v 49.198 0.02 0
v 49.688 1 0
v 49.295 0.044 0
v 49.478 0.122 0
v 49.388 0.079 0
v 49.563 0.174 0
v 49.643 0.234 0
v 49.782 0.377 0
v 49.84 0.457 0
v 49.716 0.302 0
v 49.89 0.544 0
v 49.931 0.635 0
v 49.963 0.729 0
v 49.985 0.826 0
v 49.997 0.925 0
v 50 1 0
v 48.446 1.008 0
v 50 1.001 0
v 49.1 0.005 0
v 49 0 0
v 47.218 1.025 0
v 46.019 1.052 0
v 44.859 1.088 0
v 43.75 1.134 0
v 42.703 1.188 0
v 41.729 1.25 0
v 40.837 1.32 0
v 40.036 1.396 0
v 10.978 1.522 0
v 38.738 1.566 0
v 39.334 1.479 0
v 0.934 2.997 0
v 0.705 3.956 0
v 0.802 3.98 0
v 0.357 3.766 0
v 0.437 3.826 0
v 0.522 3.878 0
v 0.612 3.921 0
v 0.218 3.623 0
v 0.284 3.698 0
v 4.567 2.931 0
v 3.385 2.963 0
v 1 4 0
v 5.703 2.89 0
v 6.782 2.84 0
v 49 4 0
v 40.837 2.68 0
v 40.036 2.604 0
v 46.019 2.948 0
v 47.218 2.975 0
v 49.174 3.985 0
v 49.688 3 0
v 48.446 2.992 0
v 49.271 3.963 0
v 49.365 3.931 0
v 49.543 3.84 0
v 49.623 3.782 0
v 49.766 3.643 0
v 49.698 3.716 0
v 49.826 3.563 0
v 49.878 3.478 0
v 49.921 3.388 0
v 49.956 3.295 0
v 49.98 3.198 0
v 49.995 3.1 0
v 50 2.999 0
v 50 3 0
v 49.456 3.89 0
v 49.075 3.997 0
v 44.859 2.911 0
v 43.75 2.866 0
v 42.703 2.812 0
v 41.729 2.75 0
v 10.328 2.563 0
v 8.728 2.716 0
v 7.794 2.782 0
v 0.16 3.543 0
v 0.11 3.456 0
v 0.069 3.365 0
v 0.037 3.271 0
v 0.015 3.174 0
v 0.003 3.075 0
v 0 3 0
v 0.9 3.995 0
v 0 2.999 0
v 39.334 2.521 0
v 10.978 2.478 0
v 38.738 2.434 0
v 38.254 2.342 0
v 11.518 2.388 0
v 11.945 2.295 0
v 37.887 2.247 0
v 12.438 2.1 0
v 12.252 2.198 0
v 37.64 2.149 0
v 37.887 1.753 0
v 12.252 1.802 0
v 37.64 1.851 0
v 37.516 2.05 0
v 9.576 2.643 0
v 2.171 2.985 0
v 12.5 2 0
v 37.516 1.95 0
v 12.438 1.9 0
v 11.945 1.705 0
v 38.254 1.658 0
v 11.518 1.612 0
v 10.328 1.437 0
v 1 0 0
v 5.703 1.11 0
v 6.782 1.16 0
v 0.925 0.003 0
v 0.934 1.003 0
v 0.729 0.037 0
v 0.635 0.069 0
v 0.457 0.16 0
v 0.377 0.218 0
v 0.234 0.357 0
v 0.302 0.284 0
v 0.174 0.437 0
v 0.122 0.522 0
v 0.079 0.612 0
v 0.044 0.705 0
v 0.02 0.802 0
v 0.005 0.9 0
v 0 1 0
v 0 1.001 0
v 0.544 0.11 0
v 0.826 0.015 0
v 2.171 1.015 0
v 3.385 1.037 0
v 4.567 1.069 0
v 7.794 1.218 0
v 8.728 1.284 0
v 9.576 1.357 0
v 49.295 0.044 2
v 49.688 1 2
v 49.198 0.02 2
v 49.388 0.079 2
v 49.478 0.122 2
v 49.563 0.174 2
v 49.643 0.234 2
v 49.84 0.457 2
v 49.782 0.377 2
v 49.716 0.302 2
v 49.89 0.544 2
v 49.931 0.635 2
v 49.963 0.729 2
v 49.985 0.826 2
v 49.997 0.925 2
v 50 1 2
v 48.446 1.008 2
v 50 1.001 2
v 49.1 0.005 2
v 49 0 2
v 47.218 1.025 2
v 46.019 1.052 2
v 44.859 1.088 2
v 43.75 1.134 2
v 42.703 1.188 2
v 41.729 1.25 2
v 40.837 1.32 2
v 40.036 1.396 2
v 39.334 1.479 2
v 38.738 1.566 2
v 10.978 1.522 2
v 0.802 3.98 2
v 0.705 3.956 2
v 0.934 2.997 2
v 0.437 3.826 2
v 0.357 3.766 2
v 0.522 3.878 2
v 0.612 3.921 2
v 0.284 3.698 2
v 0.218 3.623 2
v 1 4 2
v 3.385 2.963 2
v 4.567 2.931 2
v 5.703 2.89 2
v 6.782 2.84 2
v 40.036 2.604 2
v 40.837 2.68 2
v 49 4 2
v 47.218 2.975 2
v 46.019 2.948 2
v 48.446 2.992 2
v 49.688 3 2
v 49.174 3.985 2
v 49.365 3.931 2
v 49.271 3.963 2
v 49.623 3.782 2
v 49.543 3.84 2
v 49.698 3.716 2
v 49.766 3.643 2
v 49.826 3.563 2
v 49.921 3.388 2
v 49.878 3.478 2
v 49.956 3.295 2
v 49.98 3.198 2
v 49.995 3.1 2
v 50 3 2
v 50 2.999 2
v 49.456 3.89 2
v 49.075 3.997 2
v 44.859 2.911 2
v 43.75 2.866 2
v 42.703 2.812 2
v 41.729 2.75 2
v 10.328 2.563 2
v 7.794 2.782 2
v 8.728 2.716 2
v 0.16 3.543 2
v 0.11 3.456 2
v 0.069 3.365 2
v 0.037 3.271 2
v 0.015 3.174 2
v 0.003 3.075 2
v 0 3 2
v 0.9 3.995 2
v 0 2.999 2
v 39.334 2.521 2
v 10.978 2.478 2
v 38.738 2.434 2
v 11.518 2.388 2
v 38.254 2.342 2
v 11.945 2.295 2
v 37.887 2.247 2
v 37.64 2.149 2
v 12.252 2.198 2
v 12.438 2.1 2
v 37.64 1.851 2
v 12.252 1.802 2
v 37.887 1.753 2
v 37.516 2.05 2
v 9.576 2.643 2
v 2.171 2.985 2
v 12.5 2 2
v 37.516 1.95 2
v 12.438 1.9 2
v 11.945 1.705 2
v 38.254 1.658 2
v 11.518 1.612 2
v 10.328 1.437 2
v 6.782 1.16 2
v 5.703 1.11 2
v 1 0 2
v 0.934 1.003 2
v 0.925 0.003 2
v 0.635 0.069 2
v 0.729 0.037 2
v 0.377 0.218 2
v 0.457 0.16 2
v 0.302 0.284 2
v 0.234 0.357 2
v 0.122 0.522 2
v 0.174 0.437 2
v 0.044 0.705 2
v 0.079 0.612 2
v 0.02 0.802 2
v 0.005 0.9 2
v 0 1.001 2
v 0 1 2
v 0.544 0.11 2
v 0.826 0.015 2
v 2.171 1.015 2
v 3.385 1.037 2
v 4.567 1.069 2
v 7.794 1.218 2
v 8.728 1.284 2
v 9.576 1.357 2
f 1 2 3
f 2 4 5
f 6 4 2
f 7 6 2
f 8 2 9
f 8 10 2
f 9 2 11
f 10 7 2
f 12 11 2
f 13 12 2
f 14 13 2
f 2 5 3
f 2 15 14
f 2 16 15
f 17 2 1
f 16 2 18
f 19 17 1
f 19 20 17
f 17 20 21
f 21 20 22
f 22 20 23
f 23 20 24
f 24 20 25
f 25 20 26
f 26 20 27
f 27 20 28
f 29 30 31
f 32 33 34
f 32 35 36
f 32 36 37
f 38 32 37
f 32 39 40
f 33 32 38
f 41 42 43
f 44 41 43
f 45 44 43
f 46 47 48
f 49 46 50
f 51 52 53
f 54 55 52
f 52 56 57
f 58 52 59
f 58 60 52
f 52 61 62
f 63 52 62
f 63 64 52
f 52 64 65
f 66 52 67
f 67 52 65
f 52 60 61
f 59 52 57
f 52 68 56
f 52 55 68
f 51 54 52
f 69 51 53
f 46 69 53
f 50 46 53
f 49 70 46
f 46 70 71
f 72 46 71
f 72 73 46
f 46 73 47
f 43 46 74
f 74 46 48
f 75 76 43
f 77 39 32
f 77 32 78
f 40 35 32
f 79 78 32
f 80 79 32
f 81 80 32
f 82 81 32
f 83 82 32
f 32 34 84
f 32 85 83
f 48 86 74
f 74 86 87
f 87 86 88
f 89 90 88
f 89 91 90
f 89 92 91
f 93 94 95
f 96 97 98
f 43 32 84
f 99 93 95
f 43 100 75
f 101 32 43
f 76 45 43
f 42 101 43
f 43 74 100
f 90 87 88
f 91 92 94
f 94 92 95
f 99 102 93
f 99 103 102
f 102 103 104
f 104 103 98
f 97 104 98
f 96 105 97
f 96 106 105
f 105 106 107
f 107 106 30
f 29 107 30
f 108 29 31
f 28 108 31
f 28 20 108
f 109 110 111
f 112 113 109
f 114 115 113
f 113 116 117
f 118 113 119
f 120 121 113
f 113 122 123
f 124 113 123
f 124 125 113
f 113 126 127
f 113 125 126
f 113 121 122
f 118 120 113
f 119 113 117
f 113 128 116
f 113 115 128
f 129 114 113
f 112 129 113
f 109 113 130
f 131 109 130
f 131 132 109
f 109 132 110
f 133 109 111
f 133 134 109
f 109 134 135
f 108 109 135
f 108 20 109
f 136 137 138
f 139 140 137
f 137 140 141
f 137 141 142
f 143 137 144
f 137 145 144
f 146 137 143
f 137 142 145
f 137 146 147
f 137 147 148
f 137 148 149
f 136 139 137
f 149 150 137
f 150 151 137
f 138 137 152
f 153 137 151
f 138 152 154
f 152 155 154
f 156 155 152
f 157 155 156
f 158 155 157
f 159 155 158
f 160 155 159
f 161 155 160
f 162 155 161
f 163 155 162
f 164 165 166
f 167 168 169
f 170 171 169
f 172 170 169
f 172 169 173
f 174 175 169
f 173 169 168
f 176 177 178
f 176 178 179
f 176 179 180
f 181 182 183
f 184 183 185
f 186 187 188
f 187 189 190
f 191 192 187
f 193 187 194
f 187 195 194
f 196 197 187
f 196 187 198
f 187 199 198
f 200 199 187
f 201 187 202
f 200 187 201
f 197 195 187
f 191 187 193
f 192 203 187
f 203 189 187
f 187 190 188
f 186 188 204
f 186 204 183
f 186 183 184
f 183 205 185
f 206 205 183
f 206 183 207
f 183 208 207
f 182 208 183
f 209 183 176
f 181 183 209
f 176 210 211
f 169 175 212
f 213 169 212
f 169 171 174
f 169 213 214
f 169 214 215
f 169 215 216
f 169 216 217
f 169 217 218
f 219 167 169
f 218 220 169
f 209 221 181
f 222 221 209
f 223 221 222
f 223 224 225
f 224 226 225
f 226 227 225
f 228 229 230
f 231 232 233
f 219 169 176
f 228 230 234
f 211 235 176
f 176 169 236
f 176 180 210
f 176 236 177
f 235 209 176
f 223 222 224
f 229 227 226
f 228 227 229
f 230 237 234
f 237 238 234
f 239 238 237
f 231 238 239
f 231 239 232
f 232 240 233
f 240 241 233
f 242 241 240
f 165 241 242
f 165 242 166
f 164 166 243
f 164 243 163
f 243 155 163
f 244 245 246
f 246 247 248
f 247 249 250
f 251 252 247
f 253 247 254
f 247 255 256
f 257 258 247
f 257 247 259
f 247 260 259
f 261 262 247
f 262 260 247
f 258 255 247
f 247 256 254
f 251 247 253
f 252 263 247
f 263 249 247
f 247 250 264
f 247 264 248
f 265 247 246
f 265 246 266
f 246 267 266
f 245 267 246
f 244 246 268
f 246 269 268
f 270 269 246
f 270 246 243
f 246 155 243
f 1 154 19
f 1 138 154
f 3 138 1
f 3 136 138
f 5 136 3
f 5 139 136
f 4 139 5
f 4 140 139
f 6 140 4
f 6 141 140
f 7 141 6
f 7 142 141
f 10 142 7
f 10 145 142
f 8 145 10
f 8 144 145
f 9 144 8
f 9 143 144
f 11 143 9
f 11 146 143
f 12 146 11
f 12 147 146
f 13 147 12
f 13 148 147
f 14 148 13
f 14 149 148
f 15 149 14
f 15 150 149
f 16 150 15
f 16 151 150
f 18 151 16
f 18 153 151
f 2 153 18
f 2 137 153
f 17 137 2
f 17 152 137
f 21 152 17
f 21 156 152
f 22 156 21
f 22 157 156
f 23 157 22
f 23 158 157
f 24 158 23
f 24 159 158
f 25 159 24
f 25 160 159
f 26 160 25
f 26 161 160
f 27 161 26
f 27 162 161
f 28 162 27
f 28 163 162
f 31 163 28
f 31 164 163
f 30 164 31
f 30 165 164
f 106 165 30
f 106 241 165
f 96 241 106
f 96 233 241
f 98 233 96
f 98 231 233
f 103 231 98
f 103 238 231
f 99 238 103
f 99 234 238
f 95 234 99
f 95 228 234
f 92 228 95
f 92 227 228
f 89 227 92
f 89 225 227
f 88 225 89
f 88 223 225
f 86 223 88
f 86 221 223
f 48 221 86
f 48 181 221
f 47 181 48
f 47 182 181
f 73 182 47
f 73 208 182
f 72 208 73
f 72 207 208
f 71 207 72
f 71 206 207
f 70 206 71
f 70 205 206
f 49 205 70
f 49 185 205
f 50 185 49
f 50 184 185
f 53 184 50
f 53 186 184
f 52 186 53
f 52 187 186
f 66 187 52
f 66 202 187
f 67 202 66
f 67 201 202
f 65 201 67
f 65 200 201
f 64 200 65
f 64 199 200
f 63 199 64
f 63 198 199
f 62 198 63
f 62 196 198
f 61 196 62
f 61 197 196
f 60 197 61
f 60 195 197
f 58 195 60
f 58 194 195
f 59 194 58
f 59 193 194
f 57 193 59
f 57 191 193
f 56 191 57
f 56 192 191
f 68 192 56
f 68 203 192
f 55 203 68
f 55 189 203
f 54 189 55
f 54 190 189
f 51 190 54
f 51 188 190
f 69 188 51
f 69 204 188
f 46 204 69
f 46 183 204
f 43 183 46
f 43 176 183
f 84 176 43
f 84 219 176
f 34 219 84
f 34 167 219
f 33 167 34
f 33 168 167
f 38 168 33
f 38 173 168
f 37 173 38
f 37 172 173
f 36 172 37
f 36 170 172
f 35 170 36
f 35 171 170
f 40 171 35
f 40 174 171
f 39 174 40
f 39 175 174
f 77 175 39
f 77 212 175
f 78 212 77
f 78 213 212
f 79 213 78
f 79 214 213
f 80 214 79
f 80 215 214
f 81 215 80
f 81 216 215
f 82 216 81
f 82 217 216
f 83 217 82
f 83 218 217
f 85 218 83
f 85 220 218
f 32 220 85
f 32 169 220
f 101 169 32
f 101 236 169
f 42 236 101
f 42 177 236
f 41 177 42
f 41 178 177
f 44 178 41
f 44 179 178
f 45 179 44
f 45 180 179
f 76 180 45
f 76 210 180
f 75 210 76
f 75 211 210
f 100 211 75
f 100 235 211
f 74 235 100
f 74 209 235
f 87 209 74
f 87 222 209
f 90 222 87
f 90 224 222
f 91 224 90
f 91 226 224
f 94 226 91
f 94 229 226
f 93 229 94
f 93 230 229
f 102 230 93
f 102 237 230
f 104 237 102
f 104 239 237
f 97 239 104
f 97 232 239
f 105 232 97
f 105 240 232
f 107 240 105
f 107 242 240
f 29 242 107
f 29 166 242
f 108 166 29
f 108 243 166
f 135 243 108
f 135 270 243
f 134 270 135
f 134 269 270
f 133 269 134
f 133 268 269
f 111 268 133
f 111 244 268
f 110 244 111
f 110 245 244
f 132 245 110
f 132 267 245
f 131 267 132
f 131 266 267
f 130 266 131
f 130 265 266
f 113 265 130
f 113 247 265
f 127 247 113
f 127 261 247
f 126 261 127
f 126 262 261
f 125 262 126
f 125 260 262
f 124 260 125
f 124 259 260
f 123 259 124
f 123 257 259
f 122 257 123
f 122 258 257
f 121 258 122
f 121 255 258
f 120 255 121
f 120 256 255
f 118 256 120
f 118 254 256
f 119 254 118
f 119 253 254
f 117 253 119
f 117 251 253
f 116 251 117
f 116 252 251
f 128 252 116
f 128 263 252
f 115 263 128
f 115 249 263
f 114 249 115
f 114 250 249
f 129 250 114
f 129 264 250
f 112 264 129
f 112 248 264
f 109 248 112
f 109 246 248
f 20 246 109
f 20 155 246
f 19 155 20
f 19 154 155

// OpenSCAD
$fa = 0.4;
$fs = 0.1;

h = 2;
w = 4;
l = 50;

linear_extrude(h)
difference() {
    offset(1)
    offset(-1)
    square([l, w]);
    
    translate([0,w/2])
    scale([l/w,1])
    circle(d=w/2);
    
    translate([l,w/2])
    scale([l/w,1])
    circle(d=w/2);
}
